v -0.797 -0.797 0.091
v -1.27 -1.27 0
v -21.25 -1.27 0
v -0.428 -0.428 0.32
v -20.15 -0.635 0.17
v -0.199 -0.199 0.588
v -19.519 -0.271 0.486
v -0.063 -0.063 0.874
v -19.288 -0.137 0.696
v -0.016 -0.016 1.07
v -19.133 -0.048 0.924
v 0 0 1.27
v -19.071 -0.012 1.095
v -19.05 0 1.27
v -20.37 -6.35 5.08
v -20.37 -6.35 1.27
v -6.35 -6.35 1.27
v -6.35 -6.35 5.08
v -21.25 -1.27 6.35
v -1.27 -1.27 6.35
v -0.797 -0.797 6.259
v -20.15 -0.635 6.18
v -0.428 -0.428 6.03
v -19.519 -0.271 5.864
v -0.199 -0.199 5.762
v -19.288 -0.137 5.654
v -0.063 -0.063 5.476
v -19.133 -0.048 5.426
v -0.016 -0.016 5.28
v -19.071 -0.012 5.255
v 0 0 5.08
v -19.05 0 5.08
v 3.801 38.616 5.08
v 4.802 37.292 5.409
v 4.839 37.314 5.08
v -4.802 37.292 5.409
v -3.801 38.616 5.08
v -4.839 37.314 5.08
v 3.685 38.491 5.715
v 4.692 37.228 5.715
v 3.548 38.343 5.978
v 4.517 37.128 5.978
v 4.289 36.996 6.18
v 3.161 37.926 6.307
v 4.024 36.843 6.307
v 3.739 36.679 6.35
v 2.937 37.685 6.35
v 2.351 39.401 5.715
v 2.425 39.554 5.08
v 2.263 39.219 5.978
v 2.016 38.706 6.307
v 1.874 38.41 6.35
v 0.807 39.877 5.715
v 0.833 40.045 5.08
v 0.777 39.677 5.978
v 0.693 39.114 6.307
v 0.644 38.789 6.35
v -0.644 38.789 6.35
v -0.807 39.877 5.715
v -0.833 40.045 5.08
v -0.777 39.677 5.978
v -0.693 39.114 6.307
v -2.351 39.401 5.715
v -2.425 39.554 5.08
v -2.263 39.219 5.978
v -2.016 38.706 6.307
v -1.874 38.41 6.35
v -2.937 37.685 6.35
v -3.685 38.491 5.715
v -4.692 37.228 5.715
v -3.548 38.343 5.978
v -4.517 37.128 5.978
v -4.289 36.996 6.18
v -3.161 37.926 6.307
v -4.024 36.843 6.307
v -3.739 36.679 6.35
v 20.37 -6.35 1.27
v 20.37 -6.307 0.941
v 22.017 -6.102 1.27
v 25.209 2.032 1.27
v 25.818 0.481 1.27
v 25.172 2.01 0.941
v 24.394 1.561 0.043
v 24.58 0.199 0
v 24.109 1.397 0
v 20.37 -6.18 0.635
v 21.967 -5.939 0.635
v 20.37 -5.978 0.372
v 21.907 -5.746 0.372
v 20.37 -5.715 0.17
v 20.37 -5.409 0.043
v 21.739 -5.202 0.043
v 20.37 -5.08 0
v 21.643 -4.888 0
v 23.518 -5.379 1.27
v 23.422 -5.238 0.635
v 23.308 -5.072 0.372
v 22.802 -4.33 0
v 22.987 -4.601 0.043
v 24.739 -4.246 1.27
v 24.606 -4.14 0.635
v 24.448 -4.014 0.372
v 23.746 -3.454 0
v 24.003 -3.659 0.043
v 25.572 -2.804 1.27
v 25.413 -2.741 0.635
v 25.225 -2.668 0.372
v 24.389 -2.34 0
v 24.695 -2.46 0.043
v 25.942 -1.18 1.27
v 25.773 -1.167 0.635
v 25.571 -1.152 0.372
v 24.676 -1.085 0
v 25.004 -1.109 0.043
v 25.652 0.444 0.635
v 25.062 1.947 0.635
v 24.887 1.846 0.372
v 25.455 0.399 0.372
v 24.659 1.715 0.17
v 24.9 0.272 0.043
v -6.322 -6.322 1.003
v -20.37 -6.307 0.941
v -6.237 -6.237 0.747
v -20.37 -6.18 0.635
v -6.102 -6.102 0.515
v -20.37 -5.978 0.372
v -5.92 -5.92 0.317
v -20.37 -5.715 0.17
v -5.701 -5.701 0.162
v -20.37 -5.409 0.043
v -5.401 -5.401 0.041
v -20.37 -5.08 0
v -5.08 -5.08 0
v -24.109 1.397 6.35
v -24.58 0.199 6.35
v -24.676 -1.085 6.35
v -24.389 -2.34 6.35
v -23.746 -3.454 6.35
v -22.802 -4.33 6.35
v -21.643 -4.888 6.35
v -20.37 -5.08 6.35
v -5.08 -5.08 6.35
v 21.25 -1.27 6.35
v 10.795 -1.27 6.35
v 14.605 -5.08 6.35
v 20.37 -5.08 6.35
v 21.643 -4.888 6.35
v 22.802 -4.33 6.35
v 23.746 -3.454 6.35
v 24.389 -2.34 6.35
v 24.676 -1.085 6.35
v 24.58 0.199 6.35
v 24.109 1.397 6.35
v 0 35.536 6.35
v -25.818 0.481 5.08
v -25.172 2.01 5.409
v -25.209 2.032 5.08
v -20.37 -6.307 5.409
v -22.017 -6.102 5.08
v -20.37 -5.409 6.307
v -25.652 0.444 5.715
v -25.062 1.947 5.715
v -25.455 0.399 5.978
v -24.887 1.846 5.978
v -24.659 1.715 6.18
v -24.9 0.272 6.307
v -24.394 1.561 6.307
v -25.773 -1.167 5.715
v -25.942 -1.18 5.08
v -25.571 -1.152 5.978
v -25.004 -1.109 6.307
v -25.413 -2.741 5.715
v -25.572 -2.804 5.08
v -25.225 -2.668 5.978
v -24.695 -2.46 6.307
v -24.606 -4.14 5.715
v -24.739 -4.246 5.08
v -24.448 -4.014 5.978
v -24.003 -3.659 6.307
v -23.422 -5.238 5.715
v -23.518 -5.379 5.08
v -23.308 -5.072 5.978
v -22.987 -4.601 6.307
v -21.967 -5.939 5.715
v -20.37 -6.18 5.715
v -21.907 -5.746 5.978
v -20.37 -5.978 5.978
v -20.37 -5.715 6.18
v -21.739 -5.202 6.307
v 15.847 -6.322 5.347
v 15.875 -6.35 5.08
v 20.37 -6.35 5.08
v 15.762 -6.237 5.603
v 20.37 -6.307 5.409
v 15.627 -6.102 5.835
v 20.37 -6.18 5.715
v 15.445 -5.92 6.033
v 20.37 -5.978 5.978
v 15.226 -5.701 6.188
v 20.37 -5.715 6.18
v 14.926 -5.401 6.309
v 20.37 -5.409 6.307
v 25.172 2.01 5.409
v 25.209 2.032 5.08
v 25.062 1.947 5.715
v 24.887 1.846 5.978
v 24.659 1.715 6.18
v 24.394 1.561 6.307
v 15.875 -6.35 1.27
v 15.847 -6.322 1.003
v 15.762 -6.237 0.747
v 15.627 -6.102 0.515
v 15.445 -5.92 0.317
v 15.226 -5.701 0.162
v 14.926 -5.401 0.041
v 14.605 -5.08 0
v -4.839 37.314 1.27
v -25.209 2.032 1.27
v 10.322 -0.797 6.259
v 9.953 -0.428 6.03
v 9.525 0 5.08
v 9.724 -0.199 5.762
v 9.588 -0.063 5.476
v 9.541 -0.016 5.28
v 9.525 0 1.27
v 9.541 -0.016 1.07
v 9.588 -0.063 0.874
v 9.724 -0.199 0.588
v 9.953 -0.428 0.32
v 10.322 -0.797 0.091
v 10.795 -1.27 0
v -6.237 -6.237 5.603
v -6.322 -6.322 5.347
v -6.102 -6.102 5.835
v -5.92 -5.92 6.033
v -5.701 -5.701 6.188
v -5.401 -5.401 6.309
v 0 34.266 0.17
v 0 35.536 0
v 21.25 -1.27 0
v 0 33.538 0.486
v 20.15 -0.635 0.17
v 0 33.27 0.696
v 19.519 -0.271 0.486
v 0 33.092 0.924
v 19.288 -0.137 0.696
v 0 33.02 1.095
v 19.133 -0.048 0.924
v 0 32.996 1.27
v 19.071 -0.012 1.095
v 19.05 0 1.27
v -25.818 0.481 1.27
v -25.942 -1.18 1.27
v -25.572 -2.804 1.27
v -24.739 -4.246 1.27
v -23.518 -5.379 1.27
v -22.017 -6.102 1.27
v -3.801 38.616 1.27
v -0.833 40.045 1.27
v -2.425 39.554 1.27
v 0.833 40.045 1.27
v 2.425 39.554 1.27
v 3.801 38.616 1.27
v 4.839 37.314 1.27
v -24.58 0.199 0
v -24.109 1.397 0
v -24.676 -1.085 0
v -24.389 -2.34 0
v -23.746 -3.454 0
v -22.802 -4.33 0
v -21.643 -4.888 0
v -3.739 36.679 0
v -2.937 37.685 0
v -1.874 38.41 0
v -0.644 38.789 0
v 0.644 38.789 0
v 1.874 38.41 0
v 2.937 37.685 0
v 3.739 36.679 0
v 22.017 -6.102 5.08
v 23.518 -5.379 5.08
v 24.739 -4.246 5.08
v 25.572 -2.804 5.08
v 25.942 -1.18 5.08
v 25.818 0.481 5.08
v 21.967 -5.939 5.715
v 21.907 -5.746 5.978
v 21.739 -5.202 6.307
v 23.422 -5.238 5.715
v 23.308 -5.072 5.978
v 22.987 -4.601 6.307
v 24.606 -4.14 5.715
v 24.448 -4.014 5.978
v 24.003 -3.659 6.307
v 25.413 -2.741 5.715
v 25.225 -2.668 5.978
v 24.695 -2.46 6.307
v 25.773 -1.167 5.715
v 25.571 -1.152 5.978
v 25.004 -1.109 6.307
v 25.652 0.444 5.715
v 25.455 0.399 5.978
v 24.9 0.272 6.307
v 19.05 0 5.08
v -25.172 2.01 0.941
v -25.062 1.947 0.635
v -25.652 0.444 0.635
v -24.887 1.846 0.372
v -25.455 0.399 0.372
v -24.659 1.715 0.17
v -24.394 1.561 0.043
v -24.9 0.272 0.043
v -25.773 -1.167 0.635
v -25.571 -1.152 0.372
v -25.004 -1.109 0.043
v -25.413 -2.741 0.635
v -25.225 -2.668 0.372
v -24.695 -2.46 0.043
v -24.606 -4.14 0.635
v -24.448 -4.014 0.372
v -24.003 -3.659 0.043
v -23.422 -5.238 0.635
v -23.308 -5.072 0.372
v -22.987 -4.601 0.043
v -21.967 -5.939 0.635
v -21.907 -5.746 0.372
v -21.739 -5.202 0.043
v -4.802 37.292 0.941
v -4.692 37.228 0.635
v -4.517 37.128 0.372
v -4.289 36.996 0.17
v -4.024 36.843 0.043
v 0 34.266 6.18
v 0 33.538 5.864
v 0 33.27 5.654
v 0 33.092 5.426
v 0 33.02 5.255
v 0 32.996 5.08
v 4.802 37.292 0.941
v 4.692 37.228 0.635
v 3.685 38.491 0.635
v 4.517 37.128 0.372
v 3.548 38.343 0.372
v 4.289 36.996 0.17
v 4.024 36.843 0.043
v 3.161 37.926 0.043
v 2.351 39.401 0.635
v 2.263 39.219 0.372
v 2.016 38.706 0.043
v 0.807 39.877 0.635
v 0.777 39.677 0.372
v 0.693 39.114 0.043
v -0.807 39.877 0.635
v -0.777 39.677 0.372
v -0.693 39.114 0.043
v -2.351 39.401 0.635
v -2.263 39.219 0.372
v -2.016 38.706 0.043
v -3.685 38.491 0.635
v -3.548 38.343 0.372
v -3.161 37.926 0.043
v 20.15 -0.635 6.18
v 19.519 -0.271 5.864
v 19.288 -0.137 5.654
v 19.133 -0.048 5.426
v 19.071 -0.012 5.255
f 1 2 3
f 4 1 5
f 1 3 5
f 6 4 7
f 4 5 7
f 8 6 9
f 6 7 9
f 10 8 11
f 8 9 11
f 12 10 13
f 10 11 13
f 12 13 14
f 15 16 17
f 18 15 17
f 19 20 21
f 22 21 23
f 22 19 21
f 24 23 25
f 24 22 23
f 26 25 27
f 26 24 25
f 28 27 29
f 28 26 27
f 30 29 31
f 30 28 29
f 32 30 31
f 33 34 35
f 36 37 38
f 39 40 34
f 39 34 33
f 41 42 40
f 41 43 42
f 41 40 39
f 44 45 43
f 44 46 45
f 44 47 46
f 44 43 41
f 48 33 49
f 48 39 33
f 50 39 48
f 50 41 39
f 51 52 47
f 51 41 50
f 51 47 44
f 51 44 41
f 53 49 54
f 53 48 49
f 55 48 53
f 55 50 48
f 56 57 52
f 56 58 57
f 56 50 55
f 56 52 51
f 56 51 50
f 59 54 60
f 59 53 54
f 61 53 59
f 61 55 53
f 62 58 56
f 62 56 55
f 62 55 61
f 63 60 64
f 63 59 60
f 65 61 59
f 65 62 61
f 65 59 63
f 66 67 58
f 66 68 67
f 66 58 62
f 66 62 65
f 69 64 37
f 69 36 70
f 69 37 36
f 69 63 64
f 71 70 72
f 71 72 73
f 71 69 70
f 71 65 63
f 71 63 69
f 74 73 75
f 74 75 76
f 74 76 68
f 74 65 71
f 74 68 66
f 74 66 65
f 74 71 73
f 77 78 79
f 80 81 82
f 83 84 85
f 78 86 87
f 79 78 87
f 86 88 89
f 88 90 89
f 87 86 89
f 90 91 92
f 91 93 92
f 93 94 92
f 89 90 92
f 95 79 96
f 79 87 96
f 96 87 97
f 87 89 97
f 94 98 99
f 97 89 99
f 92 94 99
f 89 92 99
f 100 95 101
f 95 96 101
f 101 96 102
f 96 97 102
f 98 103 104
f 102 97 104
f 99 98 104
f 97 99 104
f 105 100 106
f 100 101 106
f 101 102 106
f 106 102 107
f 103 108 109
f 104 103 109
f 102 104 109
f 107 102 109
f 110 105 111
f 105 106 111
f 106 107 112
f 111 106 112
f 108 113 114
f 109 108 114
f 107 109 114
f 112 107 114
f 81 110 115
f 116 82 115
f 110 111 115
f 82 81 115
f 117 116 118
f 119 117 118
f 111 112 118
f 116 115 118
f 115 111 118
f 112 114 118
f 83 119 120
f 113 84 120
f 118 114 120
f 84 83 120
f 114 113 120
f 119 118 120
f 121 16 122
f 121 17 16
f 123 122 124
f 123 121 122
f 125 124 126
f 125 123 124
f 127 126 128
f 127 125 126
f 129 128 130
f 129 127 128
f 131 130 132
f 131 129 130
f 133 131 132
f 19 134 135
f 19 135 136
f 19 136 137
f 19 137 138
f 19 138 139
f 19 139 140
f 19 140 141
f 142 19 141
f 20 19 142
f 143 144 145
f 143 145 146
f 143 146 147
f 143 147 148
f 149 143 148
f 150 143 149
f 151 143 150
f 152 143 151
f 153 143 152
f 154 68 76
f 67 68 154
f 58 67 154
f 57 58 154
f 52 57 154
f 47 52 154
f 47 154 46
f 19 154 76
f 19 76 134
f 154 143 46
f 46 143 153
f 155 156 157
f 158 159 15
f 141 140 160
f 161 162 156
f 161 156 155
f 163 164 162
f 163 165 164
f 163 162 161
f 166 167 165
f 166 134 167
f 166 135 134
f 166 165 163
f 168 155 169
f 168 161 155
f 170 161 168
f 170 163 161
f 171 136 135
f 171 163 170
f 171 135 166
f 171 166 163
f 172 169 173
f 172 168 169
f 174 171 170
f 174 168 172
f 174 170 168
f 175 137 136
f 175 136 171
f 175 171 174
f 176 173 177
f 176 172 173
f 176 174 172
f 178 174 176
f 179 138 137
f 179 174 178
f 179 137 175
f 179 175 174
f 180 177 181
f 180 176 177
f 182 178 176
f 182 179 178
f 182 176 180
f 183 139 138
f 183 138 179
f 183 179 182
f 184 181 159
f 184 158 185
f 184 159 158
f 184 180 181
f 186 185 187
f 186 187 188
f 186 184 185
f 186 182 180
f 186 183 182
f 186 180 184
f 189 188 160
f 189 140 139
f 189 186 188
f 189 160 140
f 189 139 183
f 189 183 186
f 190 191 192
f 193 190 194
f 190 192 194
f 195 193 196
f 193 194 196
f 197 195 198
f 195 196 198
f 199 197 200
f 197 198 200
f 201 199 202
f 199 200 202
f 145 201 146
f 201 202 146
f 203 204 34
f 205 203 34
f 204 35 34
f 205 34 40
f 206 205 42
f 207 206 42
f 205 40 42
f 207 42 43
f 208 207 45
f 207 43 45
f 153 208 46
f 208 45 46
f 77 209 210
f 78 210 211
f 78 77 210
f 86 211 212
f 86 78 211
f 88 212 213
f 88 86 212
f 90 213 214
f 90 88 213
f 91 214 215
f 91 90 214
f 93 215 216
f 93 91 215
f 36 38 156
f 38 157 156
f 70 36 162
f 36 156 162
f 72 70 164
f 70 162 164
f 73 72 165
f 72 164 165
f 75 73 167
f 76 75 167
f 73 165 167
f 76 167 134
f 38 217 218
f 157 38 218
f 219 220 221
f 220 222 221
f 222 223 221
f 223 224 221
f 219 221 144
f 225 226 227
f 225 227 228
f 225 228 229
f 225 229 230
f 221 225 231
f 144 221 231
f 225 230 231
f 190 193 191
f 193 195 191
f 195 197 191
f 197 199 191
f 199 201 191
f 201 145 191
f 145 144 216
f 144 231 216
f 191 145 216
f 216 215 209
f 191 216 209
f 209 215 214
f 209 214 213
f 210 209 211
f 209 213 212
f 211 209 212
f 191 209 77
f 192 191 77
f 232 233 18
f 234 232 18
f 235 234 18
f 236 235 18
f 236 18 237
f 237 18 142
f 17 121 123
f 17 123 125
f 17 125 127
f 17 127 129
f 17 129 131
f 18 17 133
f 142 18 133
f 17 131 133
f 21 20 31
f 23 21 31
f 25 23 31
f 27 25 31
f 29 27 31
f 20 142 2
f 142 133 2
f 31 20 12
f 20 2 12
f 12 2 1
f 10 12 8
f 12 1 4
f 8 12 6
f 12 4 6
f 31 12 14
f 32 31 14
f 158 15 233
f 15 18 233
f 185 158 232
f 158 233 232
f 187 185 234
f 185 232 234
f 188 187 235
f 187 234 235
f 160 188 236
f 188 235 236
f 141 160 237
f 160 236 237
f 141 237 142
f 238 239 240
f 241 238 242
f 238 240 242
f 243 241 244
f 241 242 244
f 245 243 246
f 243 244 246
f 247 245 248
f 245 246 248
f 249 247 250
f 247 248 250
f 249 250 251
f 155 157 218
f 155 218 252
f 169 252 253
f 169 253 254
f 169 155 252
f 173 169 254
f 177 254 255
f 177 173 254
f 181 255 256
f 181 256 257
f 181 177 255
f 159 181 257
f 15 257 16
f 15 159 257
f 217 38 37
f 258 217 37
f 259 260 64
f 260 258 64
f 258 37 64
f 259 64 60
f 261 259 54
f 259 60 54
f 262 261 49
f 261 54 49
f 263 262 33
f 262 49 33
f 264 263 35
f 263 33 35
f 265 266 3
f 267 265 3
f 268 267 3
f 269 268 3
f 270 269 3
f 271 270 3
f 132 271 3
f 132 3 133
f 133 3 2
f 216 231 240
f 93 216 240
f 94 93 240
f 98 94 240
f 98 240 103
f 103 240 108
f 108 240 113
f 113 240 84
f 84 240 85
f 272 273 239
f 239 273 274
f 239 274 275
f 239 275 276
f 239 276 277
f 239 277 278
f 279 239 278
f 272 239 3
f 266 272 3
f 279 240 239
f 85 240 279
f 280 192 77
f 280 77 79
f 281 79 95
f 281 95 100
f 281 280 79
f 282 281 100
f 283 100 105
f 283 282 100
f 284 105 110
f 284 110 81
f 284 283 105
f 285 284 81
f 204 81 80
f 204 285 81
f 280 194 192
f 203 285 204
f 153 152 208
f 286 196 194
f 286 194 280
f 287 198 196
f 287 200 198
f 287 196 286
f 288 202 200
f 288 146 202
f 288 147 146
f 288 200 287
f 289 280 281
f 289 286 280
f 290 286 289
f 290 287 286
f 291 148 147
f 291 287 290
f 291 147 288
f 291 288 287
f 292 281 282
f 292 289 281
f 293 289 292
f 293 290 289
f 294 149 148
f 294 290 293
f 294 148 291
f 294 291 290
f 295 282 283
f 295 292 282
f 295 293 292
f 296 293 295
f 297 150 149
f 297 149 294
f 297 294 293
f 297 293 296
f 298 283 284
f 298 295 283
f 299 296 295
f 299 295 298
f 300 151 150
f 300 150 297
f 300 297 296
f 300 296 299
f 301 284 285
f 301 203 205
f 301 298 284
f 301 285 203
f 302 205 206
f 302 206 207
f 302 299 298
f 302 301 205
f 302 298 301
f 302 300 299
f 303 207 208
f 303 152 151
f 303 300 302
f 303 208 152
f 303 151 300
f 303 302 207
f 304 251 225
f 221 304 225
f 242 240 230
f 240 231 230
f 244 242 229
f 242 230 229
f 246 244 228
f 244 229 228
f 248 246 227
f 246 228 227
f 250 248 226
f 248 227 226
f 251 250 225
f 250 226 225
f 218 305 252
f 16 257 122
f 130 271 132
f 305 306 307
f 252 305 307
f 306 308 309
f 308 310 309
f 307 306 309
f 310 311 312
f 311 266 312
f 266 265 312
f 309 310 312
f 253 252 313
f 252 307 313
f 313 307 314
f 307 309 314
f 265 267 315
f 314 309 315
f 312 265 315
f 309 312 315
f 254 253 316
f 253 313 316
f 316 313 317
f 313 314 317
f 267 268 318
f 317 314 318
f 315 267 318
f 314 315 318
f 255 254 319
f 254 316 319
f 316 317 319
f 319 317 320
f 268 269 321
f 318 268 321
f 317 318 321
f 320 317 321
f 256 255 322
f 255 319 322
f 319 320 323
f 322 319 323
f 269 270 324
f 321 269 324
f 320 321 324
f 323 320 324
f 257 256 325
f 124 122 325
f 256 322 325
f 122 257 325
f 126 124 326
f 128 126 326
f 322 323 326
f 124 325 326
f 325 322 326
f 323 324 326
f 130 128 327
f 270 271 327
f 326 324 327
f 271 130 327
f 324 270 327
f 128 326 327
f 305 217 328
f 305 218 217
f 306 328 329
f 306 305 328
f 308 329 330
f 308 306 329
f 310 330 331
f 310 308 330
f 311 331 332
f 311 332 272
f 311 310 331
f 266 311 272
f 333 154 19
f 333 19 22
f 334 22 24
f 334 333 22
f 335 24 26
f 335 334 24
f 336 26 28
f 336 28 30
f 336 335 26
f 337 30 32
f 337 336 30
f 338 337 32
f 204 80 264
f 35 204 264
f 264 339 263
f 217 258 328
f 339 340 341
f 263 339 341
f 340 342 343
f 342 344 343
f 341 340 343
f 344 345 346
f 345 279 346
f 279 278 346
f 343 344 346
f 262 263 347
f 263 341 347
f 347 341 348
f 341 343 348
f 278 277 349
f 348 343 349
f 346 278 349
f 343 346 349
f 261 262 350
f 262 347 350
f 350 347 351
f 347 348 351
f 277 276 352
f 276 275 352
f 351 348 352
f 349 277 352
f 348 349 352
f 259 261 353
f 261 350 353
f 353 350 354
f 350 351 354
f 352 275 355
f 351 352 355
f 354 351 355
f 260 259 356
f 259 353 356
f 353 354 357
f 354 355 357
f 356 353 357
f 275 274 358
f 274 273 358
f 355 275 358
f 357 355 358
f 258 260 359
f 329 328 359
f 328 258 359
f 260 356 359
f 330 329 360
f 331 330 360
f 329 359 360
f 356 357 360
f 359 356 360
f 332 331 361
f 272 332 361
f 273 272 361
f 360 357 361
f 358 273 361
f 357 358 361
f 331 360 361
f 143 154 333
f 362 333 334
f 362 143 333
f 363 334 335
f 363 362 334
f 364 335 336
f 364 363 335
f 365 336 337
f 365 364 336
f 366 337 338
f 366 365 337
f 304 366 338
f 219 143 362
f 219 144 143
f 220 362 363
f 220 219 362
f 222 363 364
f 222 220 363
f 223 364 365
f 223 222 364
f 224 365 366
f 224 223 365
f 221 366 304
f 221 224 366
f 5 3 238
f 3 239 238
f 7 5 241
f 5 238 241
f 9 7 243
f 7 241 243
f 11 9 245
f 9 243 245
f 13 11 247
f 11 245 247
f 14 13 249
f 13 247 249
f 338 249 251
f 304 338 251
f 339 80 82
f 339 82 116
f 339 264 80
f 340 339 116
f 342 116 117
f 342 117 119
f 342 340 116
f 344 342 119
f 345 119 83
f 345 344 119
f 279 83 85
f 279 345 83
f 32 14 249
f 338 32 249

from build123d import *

# Parameters (mm, degrees)
F1_DEPTH = 6.35
F2_R     = 5.588
F3_R     = 1.27


with BuildPart() as f1:
    # F0 (on Top) → F1 (new body)
    with BuildSketch(Plane.XY):
        Polygon((0, 45.695568), (-30.048523, -6.35), (-6.35, -6.35), (0, 0), (-19.05, 0), (0, 32.995568), (19.05, 0), (9.525, 0), (15.875, -6.35), (30.048523, -6.35), align=None)
    extrude(amount=F1_DEPTH)

    # F2
    f2_edges = [f1.edges().sort_by_distance(p)[0] for p in [
        (0, 45.695568, 3.175),
        (-30.048523, -6.35, 3.175),
        (30.048523, -6.35, 3.175),
    ]]
    fillet(f2_edges, radius=F2_R)

    # F3
    f3_edges = [f1.edges().sort_by_distance(p)[0] for p in [
        (-15.024261, 19.672784, 6.35),
        (-15.024261, 19.672784, 0),
        (-9.525, 16.497784, 0),
        (9.525, 16.497784, 0),
        (14.2875, 0, 0),
        (-9.525, 0, 0),
        (9.525, 16.497784, 6.35),
        (-9.525, 16.497784, 6.35),
        (14.2875, 0, 6.35),
        (-9.525, 0, 6.35),
    ]]
    fillet(f3_edges, radius=F3_R)


solid = f1.part
